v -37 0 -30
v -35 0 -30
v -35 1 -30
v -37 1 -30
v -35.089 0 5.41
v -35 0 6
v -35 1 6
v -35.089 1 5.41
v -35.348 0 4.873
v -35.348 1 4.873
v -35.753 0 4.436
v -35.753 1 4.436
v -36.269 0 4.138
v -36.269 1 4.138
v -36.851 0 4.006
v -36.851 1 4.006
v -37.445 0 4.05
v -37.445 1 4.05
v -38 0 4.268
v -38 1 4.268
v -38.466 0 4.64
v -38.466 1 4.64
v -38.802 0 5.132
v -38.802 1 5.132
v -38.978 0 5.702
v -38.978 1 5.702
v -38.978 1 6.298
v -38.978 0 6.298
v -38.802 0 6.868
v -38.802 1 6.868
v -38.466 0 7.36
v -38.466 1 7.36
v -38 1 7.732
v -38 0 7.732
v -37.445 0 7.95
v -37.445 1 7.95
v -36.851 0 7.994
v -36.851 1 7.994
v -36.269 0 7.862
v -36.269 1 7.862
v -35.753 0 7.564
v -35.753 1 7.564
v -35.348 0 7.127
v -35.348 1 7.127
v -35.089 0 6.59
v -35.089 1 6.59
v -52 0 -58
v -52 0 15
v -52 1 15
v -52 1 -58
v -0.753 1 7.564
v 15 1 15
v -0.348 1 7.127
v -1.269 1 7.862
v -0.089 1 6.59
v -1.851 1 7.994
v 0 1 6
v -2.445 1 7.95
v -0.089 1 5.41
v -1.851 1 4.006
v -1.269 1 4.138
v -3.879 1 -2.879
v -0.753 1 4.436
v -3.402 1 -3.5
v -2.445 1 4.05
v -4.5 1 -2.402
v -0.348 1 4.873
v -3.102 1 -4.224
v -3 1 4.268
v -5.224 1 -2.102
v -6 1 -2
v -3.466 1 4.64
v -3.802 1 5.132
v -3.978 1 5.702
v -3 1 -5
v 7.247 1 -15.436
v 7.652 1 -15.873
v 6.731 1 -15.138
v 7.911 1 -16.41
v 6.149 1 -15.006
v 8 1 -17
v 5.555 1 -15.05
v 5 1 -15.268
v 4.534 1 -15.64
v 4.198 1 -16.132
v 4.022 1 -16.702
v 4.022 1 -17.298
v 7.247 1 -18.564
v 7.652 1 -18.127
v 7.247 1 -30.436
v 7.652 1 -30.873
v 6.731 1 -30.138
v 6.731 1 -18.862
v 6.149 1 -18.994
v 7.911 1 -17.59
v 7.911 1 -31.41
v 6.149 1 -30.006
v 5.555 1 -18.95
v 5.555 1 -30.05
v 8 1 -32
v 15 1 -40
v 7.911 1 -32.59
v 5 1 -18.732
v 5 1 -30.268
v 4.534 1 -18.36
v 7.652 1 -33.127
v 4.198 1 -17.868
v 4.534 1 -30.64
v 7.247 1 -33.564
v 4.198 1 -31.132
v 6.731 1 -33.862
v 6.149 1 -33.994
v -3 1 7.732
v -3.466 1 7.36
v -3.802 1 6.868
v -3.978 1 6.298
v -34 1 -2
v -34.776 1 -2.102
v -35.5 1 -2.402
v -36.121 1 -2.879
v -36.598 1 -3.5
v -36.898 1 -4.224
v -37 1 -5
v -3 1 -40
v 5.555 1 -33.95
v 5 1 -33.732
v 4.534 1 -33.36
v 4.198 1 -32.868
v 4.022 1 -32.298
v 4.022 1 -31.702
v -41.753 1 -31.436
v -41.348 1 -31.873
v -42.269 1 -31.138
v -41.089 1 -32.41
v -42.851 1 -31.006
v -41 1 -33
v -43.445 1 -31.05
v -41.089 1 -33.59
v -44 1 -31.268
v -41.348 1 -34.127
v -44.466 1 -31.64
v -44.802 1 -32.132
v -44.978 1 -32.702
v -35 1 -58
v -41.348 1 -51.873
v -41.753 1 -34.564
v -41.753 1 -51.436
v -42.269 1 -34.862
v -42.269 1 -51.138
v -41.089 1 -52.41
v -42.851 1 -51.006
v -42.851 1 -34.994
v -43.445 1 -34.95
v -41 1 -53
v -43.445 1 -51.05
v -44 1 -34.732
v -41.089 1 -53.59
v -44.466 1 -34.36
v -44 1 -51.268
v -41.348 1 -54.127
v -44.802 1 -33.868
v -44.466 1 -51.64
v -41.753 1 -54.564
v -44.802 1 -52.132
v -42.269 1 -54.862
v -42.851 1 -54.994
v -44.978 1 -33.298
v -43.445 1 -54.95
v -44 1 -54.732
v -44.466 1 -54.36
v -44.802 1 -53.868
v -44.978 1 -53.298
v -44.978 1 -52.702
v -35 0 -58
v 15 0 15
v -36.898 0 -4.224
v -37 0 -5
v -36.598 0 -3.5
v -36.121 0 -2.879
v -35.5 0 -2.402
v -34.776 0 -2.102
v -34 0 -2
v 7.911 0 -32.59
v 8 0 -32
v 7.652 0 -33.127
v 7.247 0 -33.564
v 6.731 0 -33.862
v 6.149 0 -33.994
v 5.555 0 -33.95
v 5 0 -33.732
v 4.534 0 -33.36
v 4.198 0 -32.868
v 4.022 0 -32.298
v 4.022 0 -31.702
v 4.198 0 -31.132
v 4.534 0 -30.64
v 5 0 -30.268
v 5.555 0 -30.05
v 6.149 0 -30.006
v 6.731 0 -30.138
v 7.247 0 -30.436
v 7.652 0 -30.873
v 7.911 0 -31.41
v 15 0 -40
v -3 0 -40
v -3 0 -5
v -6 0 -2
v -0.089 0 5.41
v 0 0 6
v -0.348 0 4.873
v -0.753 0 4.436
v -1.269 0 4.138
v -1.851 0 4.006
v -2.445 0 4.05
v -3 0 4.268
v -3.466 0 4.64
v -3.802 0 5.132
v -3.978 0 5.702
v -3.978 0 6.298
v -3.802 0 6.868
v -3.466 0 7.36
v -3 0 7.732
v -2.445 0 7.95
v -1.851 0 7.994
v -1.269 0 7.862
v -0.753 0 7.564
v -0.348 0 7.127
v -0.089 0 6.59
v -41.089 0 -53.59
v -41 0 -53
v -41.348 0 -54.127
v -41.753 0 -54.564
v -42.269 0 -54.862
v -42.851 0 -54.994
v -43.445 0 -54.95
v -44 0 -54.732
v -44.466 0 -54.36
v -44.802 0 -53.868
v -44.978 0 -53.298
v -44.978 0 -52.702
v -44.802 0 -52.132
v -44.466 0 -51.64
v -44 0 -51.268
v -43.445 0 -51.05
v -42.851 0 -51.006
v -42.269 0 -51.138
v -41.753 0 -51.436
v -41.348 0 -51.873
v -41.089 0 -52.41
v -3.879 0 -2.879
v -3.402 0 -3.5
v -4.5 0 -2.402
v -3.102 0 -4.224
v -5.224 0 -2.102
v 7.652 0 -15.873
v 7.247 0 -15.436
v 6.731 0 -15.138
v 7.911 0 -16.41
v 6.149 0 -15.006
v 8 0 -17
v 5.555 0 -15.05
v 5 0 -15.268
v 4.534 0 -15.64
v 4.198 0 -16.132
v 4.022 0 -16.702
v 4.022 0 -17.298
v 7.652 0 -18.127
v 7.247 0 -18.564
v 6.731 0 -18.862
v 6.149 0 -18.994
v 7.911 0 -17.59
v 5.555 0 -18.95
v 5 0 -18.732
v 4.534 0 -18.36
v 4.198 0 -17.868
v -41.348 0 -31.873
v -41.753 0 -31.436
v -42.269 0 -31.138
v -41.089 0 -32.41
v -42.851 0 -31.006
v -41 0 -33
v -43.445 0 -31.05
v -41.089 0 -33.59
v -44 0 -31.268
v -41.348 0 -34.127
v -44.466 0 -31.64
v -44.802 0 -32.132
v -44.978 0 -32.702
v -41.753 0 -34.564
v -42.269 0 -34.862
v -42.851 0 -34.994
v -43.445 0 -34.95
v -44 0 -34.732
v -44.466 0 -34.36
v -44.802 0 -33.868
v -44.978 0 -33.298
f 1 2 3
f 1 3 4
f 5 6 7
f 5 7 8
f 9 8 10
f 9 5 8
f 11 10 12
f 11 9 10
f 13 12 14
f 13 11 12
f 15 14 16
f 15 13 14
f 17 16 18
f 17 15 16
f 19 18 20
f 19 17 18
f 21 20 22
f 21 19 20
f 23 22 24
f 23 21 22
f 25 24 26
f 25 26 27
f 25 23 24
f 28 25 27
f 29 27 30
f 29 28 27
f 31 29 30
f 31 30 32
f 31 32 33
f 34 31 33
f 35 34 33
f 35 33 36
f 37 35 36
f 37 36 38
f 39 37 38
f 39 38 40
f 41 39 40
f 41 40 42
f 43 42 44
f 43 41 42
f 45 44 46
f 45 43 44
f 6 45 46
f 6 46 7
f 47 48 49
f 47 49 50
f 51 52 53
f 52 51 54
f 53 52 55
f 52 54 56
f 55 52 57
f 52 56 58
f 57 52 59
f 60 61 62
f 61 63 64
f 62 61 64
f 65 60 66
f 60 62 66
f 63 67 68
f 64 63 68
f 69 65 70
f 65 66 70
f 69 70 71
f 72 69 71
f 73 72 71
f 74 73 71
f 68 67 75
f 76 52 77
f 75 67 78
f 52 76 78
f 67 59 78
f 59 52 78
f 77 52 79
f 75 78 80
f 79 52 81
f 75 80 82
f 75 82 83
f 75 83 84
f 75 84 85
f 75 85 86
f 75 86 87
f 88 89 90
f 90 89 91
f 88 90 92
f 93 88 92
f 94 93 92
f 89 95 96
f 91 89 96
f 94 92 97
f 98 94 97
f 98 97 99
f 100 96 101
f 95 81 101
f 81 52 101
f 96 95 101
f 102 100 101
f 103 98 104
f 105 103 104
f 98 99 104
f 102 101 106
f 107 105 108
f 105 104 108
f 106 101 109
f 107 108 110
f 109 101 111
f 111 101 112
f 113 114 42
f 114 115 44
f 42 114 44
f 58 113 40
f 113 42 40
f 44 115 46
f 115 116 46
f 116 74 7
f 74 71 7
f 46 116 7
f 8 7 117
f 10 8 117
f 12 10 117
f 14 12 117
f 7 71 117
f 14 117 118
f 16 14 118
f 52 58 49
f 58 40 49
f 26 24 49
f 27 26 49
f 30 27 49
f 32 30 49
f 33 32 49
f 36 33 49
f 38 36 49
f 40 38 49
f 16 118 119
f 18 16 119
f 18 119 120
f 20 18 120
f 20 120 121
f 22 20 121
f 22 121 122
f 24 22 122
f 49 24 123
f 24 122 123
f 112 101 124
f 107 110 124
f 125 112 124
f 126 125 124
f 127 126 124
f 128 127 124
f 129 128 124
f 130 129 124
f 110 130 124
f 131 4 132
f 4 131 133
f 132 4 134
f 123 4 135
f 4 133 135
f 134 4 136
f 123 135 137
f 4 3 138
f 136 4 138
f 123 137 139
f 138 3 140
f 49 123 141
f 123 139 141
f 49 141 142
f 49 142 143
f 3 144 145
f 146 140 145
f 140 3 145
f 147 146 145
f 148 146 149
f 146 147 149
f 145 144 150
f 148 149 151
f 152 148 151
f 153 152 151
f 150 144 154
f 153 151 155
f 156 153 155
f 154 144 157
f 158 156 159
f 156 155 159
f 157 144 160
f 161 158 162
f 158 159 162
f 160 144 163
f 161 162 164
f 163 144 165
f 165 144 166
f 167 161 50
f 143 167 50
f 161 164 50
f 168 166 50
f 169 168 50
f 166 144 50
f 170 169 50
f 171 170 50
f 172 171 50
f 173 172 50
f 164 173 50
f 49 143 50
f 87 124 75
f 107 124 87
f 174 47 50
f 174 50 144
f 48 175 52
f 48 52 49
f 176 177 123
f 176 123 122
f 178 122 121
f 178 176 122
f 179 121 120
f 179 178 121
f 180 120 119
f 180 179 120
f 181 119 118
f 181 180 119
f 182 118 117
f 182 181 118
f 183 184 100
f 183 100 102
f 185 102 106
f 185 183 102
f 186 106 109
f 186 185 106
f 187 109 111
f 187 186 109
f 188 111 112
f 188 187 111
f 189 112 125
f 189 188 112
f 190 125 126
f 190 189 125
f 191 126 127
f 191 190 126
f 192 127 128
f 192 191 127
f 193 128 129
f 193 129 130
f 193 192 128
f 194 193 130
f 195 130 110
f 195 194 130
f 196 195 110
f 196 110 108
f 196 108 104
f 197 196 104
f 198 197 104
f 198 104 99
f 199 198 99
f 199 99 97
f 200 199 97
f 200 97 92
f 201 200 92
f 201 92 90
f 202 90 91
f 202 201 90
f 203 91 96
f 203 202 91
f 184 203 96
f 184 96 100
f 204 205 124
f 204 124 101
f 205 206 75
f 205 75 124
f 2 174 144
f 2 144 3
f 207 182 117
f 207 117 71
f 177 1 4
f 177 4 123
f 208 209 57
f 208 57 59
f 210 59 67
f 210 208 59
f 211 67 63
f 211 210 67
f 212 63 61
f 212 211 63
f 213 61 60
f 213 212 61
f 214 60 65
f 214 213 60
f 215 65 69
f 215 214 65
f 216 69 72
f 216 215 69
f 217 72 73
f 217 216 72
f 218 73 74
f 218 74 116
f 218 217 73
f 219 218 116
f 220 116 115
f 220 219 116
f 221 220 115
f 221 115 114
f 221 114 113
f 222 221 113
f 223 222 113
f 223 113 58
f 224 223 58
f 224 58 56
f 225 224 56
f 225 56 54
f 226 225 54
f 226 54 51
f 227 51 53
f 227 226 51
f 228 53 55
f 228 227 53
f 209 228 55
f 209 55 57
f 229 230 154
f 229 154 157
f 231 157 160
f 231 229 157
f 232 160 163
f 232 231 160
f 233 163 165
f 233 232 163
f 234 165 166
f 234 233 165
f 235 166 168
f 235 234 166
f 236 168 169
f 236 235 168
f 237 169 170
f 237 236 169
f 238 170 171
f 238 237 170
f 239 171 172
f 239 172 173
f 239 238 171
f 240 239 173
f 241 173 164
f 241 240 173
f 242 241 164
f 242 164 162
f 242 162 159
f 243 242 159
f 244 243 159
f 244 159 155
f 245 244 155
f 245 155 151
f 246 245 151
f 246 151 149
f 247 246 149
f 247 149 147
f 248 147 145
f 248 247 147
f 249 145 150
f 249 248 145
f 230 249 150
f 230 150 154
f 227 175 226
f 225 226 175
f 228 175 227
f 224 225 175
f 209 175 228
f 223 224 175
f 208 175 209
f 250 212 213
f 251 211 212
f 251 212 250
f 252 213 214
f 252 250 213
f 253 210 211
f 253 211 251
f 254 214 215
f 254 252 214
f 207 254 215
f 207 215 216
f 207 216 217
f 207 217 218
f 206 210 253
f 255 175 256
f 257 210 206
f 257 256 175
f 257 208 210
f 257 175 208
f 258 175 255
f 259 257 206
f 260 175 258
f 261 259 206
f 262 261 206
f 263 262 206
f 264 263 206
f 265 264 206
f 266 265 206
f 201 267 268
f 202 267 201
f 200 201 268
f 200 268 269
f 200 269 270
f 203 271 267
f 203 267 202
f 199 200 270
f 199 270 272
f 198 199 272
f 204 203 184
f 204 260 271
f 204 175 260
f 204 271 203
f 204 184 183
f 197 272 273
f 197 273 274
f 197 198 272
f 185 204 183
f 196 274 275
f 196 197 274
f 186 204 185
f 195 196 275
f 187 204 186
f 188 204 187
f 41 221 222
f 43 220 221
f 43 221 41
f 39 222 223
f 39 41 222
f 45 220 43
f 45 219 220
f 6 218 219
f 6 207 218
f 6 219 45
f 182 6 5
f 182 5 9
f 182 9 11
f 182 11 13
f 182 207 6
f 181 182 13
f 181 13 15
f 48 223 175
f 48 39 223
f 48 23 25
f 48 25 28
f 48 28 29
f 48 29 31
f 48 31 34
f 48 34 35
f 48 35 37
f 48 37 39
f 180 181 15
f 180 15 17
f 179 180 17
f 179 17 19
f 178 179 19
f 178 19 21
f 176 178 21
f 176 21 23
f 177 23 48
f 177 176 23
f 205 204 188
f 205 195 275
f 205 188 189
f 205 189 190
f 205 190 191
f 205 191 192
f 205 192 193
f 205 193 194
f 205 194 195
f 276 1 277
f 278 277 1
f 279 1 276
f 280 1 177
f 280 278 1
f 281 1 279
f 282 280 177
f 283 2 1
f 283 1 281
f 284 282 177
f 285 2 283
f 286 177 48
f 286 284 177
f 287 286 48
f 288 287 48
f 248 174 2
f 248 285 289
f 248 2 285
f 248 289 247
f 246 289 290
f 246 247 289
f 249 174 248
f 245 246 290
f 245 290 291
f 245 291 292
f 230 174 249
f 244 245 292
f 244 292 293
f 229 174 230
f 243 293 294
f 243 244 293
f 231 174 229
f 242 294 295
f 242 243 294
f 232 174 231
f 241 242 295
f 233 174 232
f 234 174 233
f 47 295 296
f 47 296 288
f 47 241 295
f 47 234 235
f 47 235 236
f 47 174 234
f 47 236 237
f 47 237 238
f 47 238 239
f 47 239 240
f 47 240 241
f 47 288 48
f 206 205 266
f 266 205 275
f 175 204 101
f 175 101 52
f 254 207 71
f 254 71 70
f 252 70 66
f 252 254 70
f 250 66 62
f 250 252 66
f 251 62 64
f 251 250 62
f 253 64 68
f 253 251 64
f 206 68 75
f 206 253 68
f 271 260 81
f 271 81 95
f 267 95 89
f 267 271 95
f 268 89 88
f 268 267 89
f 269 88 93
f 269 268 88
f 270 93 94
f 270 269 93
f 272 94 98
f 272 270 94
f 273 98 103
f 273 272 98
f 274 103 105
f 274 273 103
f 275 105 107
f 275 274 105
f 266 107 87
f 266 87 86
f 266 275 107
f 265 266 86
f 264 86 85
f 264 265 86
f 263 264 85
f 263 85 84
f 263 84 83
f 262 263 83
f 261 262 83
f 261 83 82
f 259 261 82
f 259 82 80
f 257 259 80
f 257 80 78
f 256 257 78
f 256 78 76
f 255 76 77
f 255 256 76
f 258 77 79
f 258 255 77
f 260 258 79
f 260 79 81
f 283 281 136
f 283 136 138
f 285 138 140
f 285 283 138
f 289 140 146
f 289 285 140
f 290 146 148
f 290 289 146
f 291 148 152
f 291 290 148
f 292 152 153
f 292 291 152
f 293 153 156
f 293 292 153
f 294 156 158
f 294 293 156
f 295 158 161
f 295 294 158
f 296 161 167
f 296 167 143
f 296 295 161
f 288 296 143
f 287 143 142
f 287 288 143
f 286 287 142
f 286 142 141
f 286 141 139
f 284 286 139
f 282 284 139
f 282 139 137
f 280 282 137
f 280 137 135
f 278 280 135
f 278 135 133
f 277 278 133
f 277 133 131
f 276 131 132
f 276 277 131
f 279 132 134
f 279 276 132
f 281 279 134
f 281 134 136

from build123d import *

# Parameters (mm, degrees)
SKETCH1_R           = 2
BOSS_EXTRUDE2_DEPTH = 1


with BuildPart() as part:
    # Sketch1 → Boss-Extrude2 (new body)
    with BuildSketch(Plane(origin=(0, 0, 0), x_dir=(1, 0, 0), z_dir=(0, 1, 0))):
        with BuildLine():
            Line((0, 40), (15, 40))
            Line((15, 40), (15, 0))
            Line((15, 0), (15, -15))
            Line((15, -15), (-52, -15))
            Line((-52, -15), (-52, 58))
            Line((-52, 58), (-37, 58))
            Line((-37, 58), (-35, 58))
            Line((-35, 58), (-35, 30))
            Line((-35, 30), (-37, 30))
            Line((-37, 30), (-37, 5))
            ThreePointArc((-37, 5), (-36.121320344, 2.878679656), (-34, 2))
            Line((-34, 2), (-6, 2))
            ThreePointArc((-6, 2), (-3.878679656, 2.878679656), (-3, 5))
            Line((-3, 5), (-3, 40))
            Line((-3, 40), (0, 40))
        make_face()
        with Locations((6, 32)):
            Circle(SKETCH1_R, mode=Mode.SUBTRACT)
        with Locations((6, 17)):
            Circle(SKETCH1_R, mode=Mode.SUBTRACT)
        with Locations((-43, 53)):
            Circle(SKETCH1_R, mode=Mode.SUBTRACT)
        with Locations((-43, 33)):
            Circle(SKETCH1_R, mode=Mode.SUBTRACT)
        with Locations((-37, -6)):
            Circle(SKETCH1_R, mode=Mode.SUBTRACT)
        with Locations((-2, -6)):
            Circle(SKETCH1_R, mode=Mode.SUBTRACT)
    extrude(amount=BOSS_EXTRUDE2_DEPTH)


solid = part.part
